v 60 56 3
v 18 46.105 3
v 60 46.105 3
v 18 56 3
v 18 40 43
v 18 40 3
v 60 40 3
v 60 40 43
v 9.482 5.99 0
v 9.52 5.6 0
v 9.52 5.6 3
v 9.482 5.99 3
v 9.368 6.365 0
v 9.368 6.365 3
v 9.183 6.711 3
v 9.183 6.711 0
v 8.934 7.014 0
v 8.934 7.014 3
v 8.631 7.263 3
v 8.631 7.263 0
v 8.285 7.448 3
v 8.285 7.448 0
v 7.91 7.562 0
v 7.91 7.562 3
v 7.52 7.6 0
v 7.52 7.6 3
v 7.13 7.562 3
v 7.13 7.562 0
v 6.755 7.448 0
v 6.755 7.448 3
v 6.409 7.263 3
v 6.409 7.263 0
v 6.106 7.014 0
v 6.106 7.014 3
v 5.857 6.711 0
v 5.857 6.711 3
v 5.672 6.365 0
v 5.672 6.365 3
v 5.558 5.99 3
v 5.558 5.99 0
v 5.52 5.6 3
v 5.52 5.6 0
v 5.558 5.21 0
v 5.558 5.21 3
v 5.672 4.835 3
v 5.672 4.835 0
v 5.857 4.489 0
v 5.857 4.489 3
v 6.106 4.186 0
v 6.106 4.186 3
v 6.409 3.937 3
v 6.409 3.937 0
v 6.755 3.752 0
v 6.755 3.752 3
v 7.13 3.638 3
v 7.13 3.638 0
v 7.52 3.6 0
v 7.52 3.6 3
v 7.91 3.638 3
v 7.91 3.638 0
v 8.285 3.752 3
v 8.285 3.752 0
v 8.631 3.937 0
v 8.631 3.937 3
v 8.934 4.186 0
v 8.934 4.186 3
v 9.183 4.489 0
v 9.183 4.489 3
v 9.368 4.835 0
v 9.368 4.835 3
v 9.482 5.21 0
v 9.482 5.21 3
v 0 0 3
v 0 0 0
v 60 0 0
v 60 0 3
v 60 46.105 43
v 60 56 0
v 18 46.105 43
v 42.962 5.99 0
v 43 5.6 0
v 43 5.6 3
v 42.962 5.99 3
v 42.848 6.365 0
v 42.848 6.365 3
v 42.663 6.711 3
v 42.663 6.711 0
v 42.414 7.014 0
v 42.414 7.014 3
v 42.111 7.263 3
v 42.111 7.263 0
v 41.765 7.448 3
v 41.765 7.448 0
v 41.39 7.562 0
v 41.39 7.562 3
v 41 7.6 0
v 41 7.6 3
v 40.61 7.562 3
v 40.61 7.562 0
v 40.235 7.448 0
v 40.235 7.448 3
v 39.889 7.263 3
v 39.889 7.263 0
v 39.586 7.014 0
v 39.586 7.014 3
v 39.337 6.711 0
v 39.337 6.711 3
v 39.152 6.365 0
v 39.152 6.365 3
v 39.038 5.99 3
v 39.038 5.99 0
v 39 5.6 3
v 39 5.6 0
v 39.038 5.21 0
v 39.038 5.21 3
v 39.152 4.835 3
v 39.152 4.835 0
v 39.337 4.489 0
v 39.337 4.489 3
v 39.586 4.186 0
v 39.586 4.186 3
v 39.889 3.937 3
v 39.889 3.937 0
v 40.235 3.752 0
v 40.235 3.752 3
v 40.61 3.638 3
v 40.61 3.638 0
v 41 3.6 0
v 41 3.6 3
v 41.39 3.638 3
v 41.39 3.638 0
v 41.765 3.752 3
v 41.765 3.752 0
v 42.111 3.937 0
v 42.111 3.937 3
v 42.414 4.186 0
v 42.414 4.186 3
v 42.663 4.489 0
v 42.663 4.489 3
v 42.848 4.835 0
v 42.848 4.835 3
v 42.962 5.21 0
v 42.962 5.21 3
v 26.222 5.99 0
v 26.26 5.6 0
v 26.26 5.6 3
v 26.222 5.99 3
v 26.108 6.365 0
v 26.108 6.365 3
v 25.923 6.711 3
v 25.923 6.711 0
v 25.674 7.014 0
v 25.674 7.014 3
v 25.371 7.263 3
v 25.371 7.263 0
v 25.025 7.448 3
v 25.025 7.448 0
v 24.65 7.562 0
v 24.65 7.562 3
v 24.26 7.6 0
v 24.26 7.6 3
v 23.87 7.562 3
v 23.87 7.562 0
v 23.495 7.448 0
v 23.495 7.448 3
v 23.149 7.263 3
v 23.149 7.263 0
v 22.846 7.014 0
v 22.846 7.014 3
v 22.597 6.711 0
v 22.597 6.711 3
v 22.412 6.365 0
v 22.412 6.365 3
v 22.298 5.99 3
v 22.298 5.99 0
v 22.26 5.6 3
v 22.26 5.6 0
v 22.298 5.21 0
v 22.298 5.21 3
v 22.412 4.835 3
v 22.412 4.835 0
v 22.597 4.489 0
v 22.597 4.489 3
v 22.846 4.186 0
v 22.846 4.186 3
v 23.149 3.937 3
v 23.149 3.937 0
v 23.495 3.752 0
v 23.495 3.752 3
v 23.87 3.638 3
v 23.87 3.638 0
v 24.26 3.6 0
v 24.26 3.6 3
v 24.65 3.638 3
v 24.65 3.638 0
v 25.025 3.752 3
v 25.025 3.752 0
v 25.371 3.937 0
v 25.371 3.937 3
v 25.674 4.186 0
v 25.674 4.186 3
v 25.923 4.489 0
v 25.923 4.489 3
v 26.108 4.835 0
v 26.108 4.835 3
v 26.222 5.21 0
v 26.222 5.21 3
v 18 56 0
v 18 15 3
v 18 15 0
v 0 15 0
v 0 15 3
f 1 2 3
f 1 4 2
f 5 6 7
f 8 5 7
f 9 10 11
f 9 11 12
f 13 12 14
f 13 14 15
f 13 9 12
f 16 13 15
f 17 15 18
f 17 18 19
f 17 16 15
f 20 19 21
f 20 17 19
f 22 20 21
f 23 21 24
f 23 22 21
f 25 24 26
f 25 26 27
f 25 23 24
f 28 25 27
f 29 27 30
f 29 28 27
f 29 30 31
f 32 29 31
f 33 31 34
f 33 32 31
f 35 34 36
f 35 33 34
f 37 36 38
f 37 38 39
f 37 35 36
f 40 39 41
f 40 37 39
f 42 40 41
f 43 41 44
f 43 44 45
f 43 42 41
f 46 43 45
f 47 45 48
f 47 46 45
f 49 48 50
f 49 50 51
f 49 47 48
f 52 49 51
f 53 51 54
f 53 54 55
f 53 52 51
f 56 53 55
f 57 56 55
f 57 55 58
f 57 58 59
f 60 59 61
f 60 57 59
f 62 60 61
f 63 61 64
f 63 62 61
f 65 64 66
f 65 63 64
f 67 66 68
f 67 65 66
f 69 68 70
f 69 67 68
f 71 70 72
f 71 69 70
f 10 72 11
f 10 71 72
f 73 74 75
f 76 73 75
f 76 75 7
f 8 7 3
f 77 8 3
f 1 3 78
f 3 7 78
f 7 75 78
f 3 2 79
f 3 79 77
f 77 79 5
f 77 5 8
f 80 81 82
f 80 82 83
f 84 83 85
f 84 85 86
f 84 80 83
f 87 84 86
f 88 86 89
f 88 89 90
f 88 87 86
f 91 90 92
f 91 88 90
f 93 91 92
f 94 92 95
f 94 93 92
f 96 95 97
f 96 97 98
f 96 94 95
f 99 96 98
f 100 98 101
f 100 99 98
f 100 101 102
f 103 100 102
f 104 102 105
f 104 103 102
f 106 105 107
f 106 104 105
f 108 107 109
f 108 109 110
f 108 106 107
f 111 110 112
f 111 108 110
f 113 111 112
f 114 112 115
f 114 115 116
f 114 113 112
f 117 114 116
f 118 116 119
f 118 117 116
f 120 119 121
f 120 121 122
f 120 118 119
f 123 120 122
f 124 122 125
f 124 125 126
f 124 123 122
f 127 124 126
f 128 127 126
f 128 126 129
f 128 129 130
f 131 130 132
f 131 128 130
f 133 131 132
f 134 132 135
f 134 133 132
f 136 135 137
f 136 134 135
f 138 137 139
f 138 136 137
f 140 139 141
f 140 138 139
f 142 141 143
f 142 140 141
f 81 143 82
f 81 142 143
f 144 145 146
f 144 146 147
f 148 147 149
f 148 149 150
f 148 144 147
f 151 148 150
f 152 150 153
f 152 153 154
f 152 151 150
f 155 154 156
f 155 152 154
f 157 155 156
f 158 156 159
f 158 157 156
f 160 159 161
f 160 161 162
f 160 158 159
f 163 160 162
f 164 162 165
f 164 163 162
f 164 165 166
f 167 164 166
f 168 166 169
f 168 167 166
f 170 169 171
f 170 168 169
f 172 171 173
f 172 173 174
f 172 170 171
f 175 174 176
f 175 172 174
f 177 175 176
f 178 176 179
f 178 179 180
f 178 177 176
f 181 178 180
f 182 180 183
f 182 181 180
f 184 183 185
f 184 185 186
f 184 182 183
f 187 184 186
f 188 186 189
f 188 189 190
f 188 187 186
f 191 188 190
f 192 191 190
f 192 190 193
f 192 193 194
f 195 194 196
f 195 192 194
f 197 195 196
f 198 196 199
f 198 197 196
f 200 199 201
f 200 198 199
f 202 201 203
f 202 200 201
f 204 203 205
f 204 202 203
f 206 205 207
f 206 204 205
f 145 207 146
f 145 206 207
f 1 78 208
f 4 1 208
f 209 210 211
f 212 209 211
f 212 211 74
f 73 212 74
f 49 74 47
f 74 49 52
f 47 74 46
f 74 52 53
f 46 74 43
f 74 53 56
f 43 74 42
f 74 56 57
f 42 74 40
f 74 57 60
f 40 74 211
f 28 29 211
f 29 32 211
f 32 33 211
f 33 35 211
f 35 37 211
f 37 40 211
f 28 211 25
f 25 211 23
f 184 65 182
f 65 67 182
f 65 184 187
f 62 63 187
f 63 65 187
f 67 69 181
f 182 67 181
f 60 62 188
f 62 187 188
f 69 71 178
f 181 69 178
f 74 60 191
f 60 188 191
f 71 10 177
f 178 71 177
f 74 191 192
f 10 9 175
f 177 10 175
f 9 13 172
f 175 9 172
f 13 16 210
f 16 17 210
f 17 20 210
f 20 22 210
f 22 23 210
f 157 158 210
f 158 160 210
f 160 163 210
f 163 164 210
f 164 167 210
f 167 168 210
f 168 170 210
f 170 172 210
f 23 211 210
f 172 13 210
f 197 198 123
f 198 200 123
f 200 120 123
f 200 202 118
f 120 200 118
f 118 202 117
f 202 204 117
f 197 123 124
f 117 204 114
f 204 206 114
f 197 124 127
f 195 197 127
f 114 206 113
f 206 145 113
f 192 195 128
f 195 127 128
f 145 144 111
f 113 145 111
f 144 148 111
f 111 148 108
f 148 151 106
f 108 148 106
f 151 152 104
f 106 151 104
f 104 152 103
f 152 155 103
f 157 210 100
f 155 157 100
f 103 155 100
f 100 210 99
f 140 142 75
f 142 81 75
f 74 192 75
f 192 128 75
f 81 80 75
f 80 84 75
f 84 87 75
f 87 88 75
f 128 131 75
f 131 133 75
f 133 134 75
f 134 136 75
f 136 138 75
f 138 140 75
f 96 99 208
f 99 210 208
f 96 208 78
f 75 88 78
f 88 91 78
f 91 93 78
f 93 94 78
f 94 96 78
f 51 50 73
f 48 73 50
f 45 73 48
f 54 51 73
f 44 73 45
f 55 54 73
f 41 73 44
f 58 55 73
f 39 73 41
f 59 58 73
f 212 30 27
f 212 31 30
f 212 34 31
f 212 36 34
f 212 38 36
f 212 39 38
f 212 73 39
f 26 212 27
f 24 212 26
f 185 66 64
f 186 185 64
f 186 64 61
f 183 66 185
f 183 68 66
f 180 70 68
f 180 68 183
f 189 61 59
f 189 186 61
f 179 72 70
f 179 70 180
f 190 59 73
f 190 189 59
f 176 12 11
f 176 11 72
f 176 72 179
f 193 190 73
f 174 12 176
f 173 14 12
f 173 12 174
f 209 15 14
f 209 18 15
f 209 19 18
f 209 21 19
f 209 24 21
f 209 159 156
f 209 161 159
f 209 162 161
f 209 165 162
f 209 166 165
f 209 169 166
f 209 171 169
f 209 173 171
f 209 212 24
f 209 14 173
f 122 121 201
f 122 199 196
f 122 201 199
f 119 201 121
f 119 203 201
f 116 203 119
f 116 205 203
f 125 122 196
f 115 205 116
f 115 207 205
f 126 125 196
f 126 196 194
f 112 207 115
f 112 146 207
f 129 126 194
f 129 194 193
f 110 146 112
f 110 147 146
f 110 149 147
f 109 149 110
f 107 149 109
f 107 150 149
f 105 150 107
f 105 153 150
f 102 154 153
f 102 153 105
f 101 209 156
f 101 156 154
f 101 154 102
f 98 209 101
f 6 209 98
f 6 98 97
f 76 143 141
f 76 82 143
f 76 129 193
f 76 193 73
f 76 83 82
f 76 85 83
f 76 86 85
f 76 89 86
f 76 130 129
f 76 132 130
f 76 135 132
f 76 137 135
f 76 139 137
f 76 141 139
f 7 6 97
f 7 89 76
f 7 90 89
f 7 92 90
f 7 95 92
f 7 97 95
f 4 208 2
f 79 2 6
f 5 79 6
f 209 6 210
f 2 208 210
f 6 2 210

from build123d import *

# Parameters (mm, degrees)
SKETCH_R     = 2
PAD_DEPTH    = 3
SKETCH001_W  = 42
SKETCH001_H  = 6.104755
PAD001_DEPTH = 40


with BuildPart() as part:
    # Sketch → Pad (new body)
    with BuildSketch(Plane.XY):
        Polygon((0, 0), (60, 0), (60, 56), (18, 56), (18, 15), (0, 15), align=None)
        with Locations((24.26, 5.6)):
            Circle(SKETCH_R, mode=Mode.SUBTRACT)
        with Locations((41, 5.6)):
            Circle(SKETCH_R, mode=Mode.SUBTRACT)
        with Locations((7.52, 5.6)):
            Circle(SKETCH_R, mode=Mode.SUBTRACT)
    extrude(amount=PAD_DEPTH)

    # Sketch001 → Pad001 (new body)
    with BuildSketch(Plane.XY.offset(3)):
        with Locations((39, 43.052377)):
            Rectangle(SKETCH001_W, SKETCH001_H)
    extrude(amount=PAD001_DEPTH)


solid = part.part
